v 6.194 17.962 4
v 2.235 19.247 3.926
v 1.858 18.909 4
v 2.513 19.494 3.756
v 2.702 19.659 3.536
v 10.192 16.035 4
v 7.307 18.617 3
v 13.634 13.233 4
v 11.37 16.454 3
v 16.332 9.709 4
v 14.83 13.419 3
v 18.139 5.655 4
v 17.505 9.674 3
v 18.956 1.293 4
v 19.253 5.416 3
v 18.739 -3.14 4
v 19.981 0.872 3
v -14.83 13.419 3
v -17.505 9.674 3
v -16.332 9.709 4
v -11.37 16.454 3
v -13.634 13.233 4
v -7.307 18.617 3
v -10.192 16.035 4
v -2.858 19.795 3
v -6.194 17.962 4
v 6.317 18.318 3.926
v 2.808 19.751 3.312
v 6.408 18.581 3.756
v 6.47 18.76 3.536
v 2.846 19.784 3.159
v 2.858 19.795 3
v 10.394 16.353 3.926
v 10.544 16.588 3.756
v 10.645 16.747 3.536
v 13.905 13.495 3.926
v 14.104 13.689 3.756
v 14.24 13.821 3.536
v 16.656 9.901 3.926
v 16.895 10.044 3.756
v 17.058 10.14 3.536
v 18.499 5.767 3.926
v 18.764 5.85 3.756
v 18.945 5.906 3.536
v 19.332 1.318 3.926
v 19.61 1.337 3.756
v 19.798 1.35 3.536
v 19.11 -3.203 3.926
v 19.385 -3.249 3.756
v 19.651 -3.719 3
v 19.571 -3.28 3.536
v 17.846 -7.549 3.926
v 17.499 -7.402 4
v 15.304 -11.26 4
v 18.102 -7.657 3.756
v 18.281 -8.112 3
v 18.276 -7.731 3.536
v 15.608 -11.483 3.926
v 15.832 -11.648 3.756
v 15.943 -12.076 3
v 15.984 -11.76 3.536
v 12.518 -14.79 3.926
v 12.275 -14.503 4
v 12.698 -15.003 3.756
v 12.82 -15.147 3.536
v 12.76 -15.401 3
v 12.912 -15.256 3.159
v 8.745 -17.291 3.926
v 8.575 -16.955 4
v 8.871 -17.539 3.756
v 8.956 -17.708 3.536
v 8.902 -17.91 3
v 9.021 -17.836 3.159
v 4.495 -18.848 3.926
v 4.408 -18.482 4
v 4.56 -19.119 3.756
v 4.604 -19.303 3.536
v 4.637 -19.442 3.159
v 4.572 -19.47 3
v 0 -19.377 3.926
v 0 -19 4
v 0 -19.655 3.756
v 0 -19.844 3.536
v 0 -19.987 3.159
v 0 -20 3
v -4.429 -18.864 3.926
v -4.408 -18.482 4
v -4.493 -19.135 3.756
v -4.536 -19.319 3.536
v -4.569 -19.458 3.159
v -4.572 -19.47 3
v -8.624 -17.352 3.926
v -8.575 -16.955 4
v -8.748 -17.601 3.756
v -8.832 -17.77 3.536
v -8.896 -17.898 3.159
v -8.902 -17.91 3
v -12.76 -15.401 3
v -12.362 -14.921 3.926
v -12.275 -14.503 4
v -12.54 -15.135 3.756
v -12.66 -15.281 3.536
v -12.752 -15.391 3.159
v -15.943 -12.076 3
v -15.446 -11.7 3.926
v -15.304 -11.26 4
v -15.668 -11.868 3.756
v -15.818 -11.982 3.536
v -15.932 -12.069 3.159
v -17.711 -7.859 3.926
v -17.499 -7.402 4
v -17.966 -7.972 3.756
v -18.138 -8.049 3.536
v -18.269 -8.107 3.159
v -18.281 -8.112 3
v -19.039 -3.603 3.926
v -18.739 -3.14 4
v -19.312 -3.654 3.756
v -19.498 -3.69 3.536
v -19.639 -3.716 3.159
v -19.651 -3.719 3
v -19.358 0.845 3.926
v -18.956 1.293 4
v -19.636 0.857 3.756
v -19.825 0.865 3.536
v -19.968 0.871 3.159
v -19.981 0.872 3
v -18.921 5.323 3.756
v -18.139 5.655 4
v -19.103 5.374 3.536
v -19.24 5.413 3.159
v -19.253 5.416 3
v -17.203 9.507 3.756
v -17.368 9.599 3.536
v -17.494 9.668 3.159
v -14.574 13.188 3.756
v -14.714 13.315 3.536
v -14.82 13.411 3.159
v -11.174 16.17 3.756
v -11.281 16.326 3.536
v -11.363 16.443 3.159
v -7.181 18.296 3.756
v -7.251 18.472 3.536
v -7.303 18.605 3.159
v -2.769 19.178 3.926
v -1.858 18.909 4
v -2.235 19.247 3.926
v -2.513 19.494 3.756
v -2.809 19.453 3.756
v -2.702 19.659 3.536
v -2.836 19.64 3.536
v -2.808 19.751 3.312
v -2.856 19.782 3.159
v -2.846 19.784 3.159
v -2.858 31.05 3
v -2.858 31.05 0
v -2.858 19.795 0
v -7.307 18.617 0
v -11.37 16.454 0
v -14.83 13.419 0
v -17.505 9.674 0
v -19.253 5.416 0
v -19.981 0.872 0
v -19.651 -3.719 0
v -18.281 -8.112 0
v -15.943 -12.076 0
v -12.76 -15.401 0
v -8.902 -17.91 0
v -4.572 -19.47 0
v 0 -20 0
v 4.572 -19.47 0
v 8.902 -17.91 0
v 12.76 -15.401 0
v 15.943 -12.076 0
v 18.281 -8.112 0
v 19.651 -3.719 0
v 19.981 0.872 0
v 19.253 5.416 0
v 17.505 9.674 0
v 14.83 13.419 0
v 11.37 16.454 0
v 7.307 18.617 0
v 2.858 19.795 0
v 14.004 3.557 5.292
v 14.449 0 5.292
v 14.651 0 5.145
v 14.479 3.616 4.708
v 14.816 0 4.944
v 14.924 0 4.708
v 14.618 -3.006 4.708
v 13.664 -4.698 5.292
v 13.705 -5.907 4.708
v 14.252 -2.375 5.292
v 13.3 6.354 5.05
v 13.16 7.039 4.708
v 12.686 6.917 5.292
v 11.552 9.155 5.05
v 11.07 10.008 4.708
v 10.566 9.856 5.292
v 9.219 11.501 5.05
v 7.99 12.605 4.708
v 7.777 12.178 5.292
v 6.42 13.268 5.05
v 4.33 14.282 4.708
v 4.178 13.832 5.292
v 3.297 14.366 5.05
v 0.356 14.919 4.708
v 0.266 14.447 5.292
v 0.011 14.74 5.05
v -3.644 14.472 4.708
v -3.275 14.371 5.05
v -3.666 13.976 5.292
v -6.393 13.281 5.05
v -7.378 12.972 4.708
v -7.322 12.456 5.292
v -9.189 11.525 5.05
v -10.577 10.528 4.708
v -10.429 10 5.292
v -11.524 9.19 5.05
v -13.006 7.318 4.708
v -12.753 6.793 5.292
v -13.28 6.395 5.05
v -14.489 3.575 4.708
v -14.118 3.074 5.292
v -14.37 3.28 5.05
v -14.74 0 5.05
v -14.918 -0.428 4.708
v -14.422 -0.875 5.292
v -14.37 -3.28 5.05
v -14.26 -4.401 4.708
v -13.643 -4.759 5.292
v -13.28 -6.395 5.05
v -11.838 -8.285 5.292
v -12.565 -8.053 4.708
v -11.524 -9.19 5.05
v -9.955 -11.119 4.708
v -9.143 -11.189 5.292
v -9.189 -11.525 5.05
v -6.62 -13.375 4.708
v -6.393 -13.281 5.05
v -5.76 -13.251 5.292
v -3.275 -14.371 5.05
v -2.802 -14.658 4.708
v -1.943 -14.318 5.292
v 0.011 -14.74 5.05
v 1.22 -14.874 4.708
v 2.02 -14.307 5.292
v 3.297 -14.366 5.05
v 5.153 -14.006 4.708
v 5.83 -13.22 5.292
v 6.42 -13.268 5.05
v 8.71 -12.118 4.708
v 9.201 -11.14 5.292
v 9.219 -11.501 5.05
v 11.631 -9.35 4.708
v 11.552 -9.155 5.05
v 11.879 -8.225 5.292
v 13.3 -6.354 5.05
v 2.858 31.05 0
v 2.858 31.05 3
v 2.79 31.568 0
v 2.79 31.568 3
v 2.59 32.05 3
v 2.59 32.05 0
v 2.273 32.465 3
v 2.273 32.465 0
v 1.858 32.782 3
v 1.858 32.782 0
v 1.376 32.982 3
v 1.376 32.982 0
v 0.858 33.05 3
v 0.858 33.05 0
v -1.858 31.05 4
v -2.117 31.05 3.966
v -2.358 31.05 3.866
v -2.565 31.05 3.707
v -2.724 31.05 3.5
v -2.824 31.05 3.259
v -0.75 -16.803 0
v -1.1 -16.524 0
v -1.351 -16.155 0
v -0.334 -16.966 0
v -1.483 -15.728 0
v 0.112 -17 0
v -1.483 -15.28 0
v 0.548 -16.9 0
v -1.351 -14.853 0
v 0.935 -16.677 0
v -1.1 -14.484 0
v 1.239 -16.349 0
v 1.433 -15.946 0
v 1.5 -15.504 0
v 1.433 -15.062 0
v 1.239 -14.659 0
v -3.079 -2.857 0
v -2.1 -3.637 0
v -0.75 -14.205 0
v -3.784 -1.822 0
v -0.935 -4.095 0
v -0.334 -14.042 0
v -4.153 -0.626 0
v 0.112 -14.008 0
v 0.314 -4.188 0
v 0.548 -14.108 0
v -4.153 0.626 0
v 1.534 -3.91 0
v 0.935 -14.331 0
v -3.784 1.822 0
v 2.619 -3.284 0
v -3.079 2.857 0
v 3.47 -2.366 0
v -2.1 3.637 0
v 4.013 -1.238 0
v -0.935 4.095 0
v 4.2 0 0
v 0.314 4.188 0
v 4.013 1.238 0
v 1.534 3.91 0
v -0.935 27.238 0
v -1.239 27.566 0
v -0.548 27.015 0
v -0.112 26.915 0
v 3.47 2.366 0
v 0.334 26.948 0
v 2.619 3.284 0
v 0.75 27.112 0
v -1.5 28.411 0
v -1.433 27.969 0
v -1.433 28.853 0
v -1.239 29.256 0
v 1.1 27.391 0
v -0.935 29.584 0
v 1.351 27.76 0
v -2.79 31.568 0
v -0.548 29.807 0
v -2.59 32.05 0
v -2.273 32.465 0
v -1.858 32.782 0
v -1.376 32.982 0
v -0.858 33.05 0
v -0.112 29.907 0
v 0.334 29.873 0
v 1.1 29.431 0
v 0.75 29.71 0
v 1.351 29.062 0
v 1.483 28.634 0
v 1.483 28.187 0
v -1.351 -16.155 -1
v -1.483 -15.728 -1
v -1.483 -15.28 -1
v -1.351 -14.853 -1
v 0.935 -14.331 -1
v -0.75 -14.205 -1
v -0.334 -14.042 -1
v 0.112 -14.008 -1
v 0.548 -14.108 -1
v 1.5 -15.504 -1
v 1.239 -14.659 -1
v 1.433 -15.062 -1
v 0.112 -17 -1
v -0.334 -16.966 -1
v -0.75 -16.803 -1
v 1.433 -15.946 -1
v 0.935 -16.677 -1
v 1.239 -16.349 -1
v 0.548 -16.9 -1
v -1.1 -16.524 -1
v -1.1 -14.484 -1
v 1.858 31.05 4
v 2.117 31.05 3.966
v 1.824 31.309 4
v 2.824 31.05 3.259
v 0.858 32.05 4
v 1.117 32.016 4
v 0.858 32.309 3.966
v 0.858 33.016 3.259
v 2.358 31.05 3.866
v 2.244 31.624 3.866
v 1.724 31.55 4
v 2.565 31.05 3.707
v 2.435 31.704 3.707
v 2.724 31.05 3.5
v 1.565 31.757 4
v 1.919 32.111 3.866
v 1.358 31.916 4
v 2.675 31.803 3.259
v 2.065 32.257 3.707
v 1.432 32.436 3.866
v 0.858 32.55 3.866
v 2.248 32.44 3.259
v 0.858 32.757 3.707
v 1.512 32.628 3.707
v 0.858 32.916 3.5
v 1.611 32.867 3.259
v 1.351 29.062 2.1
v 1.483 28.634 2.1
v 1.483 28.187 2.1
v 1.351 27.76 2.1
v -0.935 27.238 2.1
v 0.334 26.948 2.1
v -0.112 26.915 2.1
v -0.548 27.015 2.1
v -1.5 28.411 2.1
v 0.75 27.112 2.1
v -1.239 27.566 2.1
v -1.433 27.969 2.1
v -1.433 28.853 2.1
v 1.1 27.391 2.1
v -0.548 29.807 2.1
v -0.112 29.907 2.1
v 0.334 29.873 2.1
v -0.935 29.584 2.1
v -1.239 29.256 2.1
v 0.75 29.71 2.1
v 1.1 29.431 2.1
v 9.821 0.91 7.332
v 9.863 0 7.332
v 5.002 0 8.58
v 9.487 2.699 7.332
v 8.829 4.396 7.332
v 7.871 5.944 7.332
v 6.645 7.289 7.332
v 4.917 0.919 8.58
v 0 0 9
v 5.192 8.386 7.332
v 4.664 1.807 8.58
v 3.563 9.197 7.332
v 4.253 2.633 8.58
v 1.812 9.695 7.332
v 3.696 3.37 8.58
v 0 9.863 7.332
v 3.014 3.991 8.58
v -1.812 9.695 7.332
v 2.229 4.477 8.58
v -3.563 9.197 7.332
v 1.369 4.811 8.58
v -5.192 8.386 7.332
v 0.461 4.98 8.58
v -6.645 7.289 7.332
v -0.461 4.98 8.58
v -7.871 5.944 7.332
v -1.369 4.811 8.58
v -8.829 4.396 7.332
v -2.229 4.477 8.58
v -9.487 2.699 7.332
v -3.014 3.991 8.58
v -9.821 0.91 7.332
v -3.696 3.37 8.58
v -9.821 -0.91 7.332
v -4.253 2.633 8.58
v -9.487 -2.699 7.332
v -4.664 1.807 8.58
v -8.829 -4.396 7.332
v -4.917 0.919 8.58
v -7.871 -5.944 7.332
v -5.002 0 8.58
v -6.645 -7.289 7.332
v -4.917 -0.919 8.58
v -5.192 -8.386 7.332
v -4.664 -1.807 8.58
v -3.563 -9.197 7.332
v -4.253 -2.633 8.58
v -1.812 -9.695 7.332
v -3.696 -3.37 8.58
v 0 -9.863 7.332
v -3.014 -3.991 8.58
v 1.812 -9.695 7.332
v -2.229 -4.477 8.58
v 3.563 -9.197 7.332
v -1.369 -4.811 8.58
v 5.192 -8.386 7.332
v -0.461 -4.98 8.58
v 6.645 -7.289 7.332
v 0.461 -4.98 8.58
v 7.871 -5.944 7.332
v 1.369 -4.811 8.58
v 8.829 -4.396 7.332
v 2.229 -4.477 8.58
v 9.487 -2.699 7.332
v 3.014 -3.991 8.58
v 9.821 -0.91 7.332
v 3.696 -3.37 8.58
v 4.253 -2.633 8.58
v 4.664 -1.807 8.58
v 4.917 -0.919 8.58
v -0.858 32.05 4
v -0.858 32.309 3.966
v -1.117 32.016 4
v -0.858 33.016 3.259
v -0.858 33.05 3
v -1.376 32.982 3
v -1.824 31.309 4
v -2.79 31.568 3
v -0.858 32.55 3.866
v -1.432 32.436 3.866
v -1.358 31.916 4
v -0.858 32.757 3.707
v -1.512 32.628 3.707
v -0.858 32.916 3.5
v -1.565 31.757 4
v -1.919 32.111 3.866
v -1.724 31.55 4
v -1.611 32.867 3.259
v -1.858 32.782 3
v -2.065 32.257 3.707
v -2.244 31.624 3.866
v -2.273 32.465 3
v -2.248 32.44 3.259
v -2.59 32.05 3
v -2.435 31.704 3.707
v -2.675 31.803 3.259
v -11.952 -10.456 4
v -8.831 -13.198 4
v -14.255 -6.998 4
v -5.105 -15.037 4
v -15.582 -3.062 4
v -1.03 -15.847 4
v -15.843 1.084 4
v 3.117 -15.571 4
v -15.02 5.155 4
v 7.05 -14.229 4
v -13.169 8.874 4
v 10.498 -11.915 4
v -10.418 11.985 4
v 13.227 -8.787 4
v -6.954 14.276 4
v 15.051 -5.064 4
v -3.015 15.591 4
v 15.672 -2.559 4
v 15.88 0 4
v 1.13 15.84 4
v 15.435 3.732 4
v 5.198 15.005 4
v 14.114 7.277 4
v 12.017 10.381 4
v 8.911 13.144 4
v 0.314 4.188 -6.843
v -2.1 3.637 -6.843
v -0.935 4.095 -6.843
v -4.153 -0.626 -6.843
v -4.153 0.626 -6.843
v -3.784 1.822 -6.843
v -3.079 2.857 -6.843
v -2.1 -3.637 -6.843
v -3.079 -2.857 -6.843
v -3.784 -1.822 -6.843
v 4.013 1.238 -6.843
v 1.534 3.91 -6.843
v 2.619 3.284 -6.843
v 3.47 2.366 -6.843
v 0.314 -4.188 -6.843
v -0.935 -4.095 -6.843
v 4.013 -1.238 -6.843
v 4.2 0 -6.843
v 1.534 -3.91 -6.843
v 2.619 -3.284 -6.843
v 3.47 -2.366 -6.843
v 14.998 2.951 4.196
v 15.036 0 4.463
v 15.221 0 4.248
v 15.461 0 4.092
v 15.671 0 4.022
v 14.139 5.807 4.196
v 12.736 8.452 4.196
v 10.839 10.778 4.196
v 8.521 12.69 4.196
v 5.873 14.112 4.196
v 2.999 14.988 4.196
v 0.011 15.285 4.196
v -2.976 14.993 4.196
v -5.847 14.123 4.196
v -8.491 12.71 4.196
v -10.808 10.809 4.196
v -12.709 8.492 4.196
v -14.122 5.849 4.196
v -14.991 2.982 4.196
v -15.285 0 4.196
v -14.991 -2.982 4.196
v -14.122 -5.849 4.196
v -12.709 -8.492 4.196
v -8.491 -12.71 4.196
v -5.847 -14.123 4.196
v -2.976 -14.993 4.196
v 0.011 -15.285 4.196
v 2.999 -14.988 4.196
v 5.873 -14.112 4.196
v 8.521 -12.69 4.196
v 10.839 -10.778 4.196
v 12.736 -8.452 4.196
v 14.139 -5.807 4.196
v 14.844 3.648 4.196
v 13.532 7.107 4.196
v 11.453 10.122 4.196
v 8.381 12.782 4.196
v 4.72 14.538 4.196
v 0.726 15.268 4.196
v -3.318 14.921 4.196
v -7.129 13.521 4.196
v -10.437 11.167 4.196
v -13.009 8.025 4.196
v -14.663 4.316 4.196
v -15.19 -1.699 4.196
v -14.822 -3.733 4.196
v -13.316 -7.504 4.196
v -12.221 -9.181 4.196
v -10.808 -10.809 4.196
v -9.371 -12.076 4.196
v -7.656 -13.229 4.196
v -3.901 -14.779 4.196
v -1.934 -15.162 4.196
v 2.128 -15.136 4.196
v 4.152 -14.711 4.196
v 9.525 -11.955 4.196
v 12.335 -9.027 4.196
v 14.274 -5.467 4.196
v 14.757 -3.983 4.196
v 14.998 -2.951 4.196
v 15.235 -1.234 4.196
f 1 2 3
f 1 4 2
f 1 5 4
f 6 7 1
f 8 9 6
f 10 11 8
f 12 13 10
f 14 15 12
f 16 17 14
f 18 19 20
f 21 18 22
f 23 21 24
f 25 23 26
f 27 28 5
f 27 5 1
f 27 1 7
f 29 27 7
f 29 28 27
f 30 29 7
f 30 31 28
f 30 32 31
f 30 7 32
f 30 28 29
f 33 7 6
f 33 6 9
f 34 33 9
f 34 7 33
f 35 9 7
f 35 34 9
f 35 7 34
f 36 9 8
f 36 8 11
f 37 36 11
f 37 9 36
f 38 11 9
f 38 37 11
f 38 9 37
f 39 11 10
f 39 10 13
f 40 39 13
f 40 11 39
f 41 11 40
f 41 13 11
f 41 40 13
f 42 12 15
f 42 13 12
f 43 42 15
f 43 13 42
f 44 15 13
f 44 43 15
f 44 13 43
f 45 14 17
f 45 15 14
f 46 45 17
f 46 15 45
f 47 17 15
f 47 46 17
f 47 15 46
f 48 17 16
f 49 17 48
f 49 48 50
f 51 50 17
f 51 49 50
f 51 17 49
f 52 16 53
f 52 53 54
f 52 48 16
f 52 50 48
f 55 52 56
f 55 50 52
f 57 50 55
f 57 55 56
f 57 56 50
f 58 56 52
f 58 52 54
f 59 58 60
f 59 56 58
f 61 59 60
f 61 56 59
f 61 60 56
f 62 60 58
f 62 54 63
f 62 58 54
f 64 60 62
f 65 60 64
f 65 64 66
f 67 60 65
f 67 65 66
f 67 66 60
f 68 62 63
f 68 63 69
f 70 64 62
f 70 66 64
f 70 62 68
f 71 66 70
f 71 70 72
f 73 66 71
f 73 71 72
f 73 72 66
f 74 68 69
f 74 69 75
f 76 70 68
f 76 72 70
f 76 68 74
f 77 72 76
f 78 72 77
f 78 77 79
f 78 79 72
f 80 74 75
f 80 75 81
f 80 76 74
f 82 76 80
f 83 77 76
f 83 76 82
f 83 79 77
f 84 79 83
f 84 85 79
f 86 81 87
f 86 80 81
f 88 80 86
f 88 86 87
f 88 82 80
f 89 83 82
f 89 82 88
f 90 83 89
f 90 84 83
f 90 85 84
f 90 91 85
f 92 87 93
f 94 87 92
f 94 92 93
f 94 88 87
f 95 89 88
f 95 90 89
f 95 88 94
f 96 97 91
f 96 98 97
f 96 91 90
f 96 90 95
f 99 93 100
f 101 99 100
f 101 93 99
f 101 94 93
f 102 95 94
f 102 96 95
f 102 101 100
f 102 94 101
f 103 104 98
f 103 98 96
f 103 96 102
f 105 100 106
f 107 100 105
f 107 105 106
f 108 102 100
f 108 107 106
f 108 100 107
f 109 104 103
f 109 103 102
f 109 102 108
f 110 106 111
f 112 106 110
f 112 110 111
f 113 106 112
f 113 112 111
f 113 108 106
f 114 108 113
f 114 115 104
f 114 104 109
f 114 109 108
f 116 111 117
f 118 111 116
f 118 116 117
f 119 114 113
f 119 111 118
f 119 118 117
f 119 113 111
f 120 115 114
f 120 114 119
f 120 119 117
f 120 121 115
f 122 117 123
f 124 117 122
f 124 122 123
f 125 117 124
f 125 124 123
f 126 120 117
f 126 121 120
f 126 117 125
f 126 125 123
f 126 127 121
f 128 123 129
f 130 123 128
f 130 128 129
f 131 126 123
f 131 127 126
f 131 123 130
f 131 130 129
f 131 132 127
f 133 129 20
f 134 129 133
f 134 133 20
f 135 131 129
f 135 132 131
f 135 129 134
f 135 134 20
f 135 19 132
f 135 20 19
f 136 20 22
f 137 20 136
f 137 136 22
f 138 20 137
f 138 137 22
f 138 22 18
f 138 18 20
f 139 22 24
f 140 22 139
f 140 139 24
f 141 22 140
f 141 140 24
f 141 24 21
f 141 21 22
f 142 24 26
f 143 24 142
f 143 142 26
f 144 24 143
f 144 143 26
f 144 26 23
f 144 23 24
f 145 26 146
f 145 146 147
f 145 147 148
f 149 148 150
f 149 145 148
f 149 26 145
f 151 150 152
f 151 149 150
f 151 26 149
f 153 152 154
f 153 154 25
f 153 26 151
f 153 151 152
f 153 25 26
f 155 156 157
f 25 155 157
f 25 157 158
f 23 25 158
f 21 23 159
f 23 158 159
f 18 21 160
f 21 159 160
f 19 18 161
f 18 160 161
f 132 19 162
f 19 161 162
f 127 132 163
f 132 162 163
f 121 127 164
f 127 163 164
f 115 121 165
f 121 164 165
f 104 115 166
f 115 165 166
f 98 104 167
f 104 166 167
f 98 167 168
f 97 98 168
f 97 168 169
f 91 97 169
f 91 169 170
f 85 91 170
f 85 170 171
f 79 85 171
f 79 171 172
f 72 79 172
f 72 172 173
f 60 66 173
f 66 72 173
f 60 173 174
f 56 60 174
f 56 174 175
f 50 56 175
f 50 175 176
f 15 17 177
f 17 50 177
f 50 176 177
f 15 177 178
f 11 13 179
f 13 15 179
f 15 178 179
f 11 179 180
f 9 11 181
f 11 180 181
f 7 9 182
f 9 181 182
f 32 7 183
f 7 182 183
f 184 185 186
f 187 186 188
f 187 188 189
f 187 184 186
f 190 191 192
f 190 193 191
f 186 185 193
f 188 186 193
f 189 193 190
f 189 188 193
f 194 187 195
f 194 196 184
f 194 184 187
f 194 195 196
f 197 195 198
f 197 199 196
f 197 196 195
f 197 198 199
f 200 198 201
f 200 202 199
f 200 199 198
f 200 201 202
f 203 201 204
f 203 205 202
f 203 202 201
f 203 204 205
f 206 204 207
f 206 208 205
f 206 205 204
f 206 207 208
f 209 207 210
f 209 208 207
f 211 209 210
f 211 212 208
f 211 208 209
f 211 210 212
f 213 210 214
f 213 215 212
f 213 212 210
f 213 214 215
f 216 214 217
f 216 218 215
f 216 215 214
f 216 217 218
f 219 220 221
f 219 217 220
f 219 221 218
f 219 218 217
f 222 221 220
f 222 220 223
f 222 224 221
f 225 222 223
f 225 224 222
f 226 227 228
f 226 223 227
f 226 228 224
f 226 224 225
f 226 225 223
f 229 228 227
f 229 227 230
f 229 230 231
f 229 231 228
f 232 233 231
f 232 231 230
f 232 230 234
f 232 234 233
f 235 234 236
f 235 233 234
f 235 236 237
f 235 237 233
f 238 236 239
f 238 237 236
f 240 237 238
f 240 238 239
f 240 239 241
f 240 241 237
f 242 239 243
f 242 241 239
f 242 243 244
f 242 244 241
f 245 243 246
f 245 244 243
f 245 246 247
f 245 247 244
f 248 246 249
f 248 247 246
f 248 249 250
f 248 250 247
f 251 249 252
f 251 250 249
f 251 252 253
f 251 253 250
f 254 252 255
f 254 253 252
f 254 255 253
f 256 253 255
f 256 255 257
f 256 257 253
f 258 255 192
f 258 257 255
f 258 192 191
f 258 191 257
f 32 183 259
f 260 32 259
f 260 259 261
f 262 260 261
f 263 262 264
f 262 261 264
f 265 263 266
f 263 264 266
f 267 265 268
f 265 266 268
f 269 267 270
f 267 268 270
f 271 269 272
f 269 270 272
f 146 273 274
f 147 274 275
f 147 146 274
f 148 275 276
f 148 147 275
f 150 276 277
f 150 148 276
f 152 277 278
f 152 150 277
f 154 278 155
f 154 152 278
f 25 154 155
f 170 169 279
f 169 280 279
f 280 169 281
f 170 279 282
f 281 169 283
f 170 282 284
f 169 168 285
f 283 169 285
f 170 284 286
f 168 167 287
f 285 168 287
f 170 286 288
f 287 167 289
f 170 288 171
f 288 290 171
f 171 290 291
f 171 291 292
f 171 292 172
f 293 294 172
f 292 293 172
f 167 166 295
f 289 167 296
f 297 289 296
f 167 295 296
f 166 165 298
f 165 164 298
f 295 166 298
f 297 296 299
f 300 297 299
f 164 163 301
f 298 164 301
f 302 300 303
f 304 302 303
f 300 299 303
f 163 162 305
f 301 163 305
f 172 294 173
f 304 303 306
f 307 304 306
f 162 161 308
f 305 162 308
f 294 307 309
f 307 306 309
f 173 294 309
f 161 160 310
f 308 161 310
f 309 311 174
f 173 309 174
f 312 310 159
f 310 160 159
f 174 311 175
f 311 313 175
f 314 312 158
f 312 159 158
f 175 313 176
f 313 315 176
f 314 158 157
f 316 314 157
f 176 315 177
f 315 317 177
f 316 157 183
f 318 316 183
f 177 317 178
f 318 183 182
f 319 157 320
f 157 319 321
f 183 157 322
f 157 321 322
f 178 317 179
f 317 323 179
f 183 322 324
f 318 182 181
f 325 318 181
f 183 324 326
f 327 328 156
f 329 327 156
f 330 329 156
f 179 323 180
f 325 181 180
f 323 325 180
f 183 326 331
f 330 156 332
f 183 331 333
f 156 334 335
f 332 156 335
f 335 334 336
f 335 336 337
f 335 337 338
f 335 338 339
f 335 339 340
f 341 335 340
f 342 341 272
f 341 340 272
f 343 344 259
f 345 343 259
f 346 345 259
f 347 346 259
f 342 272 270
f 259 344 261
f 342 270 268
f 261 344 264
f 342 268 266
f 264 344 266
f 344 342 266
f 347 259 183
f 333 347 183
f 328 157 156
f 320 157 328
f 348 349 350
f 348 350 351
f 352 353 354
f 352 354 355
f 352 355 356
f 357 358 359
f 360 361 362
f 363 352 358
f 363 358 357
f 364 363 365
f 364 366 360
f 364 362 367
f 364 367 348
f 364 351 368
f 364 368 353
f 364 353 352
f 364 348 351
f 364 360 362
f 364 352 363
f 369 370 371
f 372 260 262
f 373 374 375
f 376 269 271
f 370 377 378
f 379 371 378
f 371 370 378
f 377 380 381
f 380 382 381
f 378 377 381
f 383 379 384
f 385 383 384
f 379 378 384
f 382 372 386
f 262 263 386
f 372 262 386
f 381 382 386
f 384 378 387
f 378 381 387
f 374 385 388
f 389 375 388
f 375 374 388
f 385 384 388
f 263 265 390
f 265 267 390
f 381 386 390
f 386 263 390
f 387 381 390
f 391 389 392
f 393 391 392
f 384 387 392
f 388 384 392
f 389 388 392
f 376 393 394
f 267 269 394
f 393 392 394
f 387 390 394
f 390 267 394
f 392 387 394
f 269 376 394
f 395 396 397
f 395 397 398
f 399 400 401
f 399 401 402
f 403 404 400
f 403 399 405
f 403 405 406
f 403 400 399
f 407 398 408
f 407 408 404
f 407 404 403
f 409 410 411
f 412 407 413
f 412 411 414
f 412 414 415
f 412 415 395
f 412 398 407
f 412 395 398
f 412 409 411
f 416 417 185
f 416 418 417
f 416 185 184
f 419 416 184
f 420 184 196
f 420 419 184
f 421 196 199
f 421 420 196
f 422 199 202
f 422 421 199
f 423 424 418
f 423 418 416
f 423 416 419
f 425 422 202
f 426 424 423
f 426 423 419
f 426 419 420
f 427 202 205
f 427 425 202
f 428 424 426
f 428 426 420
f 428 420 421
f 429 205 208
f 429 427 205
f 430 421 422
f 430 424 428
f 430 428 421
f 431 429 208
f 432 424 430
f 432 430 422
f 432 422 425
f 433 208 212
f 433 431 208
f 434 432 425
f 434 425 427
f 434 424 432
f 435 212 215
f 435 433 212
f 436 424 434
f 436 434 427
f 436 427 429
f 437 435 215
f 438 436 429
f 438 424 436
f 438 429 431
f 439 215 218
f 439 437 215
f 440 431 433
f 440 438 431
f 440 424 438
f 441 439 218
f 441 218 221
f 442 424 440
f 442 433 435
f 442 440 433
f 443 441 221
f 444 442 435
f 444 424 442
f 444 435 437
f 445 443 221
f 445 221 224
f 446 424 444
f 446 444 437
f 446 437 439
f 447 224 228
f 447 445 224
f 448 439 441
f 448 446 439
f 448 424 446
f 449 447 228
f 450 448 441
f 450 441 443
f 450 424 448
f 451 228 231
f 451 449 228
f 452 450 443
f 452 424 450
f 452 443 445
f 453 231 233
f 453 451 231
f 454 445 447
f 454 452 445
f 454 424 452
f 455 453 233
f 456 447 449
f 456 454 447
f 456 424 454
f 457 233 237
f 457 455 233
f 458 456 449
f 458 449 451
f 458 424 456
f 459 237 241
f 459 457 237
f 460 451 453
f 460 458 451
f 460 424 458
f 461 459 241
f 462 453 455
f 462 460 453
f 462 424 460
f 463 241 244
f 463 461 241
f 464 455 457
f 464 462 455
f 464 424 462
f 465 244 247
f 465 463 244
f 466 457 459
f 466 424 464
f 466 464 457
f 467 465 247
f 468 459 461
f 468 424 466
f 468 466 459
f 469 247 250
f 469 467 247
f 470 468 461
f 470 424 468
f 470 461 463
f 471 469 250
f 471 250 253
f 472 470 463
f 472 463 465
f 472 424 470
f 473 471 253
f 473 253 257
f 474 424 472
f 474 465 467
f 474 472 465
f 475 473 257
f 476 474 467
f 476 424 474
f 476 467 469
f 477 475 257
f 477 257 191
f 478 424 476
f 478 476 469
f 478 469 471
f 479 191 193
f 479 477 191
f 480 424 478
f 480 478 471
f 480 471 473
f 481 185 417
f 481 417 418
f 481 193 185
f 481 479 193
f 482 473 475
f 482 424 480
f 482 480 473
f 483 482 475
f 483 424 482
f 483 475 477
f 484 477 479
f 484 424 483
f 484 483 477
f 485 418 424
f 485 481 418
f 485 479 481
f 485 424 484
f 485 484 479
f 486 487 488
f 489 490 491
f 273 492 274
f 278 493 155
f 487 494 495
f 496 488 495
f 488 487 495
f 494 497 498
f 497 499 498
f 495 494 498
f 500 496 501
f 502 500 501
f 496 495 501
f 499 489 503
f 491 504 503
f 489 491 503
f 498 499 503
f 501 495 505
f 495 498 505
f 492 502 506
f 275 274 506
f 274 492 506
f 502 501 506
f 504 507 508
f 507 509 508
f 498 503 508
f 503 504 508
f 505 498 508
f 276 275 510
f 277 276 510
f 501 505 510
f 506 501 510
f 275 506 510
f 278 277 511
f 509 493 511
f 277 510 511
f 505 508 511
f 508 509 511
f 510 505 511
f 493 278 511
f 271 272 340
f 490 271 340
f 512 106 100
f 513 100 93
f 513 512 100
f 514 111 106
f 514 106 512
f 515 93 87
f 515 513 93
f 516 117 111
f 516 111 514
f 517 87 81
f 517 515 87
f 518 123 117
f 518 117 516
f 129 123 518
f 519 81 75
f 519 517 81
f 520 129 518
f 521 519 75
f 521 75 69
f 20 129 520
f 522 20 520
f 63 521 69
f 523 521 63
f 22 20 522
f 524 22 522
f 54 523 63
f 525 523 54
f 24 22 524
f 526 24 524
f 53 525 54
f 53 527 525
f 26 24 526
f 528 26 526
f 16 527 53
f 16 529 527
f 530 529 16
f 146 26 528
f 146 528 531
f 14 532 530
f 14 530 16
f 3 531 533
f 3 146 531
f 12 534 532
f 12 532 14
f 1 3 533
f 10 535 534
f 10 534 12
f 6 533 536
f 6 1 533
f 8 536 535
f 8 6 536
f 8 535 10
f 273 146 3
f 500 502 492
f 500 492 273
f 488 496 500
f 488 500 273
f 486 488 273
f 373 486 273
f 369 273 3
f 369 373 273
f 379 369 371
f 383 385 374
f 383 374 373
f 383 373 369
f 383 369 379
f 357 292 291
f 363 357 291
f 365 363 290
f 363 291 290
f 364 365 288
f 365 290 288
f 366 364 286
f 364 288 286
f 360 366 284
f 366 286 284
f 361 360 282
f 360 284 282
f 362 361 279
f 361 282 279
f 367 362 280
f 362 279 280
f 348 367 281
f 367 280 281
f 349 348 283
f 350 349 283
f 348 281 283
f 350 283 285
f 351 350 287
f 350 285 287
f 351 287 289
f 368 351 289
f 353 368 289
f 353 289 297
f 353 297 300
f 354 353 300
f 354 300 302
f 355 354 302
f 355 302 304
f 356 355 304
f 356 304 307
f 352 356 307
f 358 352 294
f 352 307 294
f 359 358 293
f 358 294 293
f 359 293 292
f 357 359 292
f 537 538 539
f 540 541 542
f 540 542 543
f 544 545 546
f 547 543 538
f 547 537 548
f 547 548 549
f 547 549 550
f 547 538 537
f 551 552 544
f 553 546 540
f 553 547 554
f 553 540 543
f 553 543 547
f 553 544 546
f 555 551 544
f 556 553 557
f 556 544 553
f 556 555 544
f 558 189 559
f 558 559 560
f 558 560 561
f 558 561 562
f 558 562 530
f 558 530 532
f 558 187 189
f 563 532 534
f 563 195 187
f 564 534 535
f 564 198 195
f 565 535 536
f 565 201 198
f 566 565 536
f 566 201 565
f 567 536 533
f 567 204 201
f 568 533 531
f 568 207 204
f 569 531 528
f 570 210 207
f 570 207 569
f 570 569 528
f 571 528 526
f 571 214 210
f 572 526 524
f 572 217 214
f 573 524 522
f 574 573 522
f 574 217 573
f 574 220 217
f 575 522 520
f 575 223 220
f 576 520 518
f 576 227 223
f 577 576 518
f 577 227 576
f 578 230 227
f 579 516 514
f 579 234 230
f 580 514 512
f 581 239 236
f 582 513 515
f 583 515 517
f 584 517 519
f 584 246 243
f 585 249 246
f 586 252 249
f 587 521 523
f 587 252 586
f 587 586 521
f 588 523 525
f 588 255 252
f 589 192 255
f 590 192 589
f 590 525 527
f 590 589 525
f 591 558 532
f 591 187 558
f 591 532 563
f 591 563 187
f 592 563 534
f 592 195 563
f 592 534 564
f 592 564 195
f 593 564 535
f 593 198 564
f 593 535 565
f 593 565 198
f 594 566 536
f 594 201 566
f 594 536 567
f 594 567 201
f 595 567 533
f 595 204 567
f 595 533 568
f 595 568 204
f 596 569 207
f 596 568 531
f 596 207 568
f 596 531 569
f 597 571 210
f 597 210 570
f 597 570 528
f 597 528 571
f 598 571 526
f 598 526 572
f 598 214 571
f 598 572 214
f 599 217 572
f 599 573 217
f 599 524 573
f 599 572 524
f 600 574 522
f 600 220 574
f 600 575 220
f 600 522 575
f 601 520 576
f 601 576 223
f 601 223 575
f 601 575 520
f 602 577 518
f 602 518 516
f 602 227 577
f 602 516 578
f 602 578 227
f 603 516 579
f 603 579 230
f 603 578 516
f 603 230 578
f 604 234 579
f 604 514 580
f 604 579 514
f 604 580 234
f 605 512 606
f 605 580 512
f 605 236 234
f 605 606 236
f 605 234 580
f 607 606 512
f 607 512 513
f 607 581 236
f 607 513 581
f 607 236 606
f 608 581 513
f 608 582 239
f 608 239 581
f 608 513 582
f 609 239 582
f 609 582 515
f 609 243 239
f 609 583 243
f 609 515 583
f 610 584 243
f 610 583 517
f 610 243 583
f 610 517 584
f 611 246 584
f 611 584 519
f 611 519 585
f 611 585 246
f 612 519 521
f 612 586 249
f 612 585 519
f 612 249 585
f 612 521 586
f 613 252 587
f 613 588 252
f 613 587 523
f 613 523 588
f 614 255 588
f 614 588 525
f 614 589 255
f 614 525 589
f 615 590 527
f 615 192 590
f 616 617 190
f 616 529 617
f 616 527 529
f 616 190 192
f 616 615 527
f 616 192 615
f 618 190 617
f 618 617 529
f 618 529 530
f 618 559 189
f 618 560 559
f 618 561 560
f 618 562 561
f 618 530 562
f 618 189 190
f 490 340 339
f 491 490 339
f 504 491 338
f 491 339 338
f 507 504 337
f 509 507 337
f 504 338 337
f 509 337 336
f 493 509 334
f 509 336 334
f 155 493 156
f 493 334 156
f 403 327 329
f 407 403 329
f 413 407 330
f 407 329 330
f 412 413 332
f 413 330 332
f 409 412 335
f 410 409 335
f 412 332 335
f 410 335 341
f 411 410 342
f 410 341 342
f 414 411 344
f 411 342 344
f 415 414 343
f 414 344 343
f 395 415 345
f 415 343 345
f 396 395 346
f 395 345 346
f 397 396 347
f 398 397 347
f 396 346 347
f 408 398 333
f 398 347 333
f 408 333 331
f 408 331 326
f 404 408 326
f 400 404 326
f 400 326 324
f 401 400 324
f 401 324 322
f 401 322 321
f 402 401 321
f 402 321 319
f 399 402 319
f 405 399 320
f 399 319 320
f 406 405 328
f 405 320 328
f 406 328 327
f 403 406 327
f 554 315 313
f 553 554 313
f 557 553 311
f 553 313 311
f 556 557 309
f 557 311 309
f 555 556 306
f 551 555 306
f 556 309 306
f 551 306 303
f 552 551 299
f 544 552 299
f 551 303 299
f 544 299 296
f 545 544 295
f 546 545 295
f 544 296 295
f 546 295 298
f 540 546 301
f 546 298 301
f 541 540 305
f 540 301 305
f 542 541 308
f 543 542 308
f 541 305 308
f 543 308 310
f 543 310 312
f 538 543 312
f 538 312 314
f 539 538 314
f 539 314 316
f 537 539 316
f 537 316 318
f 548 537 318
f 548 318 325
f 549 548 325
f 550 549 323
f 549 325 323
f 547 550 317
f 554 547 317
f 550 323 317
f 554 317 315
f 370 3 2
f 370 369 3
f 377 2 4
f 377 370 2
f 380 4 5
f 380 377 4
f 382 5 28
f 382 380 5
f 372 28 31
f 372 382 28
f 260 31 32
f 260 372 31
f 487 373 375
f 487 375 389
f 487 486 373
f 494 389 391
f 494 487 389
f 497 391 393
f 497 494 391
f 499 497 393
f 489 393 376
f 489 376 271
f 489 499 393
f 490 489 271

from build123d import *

# Parameters (mm, degrees)
ESQUISSE1_R             = 20
BOSS_EXTRU_1_DEPTH      = 4
ESQUISSE4_R             = 4
BOSS_EXTRU_3_DEPTH      = 6.843
BOSS_EXTRU_4_DEPTH      = 4
ESQUISSE6_R             = 1.5
ENL_V_MAT_EXTRU_1_DEPTH = 2.1
ESQUISSE7_R             = 1.5
BOSS_EXTRU_5_DEPTH      = 1
ESQUISSE8_R             = 4.2
BOSS_EXTRU_6_DEPTH      = 6.843
ESQUISSE9_R             = 14.967417913
BOSS_EXTRU_7_DEPTH      = 1
D_ME1_FACE_RADIUS       = 14.967417913
D_ME1_HEIGHT            = 4
CONG_1_R                = 1
CONG_2_R                = 1
CONG_3_R                = 1


with BuildPart() as part:
    # Esquisse1 → Boss.-Extru.1 (new body)
    with BuildSketch(Plane.XY):
        Circle(ESQUISSE1_R)
    extrude(amount=BOSS_EXTRU_1_DEPTH)

    # Esquisse4 → Boss.-Extru.3 (add)
    with BuildSketch(Plane(origin=(0, 0, 0), x_dir=(-1, 0, 0), z_dir=(0, 0, -1))):
        with Locations(Location((0, 0, 0), (0, 0, 180))):
            Circle(ESQUISSE4_R)
    extrude(amount=BOSS_EXTRU_3_DEPTH)

    # Esquisse5 → Boss.-Extru.4 (add)
    with BuildSketch(Plane(origin=(0, 0, 0), x_dir=(-1, 0, 0), z_dir=(0, 0, -1))):
        with BuildLine():
            Line((2.858287427, 14.40822907), (-2.858287427, 14.40822907))
            Line((-2.858287427, 14.40822907), (-2.858287427, 31.050344996))
            ThreePointArc((-2.858287427, 31.050344996), (-2.27250099, 32.464558559), (-0.858287427, 33.050344996))
            Line((-0.858287427, 33.050344996), (0.858287427, 33.050344996))
            ThreePointArc((0.858287427, 33.050344996), (2.27250099, 32.464558559), (2.858287427, 31.050344996))
            Line((2.858287427, 31.050344996), (2.858287427, 14.40822907))
        make_face()
    extrude(amount=-BOSS_EXTRU_4_DEPTH)

    # Esquisse6 → Enlèv. mat.-Extru.1 (cut)
    with BuildSketch(Plane(origin=(0, 0, 0), x_dir=(-1, 0, 0), z_dir=(0, 0, -1))):
        with Locations((0, 28.410842354)):
            Circle(ESQUISSE6_R)
    extrude(amount=-ENL_V_MAT_EXTRU_1_DEPTH, mode=Mode.SUBTRACT)

    # Esquisse7 → Boss.-Extru.5 (add)
    with BuildSketch(Plane(origin=(0, 0, 0), x_dir=(-1, 0, 0), z_dir=(0, 0, -1))):
        with Locations(Location((0, -15.504004846, 0), (0, 0, 180))):
            Circle(ESQUISSE7_R)
    extrude(amount=BOSS_EXTRU_5_DEPTH)

    # Esquisse8 → Boss.-Extru.6 (add)
    with BuildSketch(Plane(origin=(0, 0, 0), x_dir=(-1, 0, 0), z_dir=(0, 0, -1))):
        with Locations(Location((0, 0, 0), (0, 0, 180))):
            Circle(ESQUISSE8_R)
    extrude(amount=BOSS_EXTRU_6_DEPTH)

    # Esquisse9 → Boss.-Extru.7 (add)
    with BuildSketch(Plane.XY.offset(4)):
        Circle(ESQUISSE9_R)
    extrude(amount=BOSS_EXTRU_7_DEPTH)

    # Dôme1: a dome of height H over a round flat face of radius A is a cap of a sphere of radius (A * A + H * H) / (2 * H)
    d_me1_r = (D_ME1_FACE_RADIUS * D_ME1_FACE_RADIUS + D_ME1_HEIGHT * D_ME1_HEIGHT) / (2 * D_ME1_HEIGHT)
    d_me1_base = Plane((0, 0, 5), z_dir=(0, 0, 1))
    with Locations(d_me1_base.offset(D_ME1_HEIGHT - d_me1_r)):
        d_me1_ball = Sphere(d_me1_r, mode=Mode.PRIVATE)
    add(split(d_me1_ball, bisect_by=d_me1_base, keep=Keep.TOP, mode=Mode.PRIVATE))

    # Congé1
    cong_1_edges = [part.edges().sort_by_distance(p)[0] for p in [
        (-14.967417913, 0, 5),
    ]]
    fillet(cong_1_edges, radius=CONG_1_R)

    # Congé2
    cong_2_edges = [part.edges().sort_by_distance(p)[0] for p in [
        (-14.967417913, 0, 4),
    ]]
    fillet(cong_2_edges, radius=CONG_2_R)

    # Congé3
    cong_3_edges = [part.edges().sort_by_distance(p)[0] for p in [
        (0, -20, 4),
        (-2.858287427, 25.422523065, 4),
        (2.858287427, 25.422523065, 4),
        (2.27250099, 32.464558559, 4),
        (0, 33.050344996, 4),
        (-2.27250099, 32.464558559, 4),
    ]]
    fillet(cong_3_edges, radius=CONG_3_R)


solid = part.part
